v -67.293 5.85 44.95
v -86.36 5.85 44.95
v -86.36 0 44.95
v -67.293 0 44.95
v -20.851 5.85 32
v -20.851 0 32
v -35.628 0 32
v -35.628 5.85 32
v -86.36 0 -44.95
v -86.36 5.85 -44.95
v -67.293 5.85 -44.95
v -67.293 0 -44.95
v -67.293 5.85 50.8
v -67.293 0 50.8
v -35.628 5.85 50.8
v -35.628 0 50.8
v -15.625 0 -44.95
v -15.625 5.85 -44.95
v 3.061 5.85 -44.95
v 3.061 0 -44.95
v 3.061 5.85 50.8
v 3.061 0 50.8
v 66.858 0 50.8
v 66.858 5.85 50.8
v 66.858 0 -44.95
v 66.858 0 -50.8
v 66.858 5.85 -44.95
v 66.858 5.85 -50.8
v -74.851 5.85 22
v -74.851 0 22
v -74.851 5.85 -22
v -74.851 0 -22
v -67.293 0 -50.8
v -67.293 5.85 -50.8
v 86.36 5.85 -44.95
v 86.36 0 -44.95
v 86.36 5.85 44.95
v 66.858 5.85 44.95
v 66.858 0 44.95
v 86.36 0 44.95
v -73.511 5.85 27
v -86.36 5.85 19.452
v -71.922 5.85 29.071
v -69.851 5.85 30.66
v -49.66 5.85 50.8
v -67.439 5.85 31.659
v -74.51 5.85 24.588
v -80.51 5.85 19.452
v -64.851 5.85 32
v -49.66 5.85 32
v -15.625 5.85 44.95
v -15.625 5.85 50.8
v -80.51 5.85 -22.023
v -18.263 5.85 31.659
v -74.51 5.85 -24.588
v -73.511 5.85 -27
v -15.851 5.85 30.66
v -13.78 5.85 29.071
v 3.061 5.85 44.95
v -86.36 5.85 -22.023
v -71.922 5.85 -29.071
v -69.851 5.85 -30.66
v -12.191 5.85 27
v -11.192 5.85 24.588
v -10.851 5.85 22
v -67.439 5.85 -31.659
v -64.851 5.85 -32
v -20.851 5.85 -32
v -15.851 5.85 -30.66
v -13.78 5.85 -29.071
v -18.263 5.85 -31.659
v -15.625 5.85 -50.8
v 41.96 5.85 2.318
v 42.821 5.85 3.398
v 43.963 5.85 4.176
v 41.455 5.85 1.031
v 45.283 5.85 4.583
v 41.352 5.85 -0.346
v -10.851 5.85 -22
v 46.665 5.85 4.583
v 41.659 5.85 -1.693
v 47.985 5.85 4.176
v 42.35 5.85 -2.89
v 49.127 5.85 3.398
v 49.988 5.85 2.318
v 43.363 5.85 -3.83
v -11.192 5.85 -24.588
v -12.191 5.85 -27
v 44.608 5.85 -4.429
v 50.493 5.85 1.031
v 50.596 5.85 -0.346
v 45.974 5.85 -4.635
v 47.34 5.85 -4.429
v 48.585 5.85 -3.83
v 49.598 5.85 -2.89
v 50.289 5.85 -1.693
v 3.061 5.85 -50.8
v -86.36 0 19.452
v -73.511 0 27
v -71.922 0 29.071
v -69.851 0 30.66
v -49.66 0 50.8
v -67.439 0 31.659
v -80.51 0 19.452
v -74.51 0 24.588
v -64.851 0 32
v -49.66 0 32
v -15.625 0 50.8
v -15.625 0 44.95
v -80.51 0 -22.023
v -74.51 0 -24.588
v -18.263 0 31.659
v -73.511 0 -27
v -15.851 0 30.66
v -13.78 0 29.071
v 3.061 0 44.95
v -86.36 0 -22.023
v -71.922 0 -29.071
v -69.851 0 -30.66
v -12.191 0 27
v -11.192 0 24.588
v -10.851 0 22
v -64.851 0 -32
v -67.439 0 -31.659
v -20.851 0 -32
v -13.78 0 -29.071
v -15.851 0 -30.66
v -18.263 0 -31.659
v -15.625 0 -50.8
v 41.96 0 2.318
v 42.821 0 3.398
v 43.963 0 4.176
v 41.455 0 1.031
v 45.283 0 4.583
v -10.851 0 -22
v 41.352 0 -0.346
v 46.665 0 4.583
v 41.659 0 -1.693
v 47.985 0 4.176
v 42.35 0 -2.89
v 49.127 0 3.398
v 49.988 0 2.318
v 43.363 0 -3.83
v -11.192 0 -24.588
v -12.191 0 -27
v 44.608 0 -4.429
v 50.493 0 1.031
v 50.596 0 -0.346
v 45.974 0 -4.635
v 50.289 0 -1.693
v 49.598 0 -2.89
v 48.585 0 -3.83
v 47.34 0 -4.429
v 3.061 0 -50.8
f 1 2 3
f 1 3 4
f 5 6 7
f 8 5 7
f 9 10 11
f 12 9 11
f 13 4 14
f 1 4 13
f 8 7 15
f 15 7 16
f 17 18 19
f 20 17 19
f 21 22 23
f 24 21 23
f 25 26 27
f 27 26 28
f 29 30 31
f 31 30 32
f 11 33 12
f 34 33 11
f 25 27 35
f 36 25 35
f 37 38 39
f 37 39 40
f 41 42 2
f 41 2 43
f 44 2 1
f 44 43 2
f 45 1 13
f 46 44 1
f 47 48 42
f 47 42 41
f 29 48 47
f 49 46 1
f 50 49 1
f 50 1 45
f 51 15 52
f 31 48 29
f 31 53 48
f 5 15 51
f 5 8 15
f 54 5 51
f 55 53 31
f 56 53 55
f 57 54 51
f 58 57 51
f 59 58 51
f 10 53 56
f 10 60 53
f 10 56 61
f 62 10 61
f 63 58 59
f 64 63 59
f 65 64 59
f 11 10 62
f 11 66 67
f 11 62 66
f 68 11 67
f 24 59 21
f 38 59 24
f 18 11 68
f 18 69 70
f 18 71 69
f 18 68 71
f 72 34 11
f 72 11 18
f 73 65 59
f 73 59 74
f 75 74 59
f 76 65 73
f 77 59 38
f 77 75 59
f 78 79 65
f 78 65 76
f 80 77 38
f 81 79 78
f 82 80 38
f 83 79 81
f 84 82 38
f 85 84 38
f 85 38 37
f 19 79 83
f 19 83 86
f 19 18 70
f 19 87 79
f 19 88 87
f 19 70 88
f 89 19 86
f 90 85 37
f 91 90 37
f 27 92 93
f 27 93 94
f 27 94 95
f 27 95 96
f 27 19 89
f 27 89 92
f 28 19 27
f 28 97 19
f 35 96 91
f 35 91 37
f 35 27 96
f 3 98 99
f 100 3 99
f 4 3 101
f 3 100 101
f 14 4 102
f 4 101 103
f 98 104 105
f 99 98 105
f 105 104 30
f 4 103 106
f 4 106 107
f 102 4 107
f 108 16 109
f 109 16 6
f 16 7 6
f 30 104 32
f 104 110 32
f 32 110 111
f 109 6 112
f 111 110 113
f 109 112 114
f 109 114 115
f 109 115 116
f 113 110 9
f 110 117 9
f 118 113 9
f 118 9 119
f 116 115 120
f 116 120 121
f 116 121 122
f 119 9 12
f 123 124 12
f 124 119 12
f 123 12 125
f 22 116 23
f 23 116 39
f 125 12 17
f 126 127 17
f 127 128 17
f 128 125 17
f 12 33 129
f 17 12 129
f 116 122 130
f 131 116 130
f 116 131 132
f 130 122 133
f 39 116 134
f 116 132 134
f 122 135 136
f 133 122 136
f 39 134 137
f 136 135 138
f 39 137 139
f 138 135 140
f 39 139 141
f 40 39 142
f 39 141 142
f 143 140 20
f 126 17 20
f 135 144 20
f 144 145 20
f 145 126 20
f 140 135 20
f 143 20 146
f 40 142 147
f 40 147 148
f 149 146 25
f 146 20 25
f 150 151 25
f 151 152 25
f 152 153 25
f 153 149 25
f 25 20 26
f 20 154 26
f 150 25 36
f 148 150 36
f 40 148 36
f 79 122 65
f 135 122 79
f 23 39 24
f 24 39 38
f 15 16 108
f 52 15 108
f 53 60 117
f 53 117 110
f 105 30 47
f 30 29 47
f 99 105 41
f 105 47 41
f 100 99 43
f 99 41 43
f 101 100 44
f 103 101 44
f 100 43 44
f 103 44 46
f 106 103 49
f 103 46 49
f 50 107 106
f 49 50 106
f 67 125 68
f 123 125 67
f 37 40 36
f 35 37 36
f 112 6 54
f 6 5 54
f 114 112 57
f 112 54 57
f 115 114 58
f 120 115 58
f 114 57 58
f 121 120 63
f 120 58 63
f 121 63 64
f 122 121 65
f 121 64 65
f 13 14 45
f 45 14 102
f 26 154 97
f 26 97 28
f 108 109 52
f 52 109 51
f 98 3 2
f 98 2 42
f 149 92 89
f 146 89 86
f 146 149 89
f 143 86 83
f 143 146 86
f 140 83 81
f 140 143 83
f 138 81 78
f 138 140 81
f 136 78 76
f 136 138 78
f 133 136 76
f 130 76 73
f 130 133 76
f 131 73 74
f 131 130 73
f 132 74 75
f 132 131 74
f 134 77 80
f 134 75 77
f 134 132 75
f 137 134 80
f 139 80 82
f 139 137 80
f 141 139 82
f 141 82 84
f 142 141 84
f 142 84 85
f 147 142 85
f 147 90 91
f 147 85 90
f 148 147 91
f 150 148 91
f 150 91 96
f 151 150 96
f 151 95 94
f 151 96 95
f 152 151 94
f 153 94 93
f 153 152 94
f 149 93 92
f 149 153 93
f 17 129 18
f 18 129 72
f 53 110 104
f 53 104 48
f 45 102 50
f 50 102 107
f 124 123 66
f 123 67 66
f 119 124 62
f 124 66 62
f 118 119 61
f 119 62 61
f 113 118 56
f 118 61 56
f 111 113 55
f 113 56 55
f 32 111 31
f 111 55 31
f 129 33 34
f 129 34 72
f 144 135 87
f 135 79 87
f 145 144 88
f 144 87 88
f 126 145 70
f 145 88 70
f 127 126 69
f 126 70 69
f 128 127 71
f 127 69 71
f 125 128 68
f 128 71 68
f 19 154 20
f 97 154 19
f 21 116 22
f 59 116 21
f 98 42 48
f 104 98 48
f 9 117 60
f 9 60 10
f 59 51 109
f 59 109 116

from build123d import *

# Parameters (mm, degrees)
SKETCH1_W             = 172.72
SKETCH1_H             = 101.6
BOSS_EXTRUDE1_DEPTH   = 5.85
SKETCH5_R             = 4.635
CUT_EXTRUDE10_DEPTH   = 20
FILLET6_R             = 10
CAVITY1_START         = -50.8
CAVITY1_OUTLINE_W     = 19.066688648
CAVITY1_OUTLINE_H     = 5.85
CAVITY1_OUTLINE_W_2   = 18.685550926
CAVITY1_OUTLINE_W_3   = 19.50170991
CAVITY1_DEPTH         = 5.85
CAVITY1_START_2       = 44.95
CAVITY1_2_OUTLINE_W   = 19.066688648
CAVITY1_2_OUTLINE_H   = 5.85
CAVITY1_2_OUTLINE_W_2 = 18.685550926
CAVITY1_2_OUTLINE_W_3 = 19.50170991
CAVITY1_2_DEPTH       = 5.85
CAVITY1_START_3       = -22.02311963
CAVITY1_3_OUTLINE_W   = 5.85
CAVITY1_3_OUTLINE_H   = 5.85
CAVITY1_3_DEPTH       = 41.475447085


# Read off the part's stored shape, not the designer's step: Cavity1
with BuildPart() as part:
    # Sketch1 → Boss-Extrude1 (new body)
    with BuildSketch(Plane(origin=(0, 0, 0), x_dir=(1, 0, 0), z_dir=(0, 1, 0))):
        Rectangle(SKETCH1_W, SKETCH1_H)
    extrude(amount=BOSS_EXTRUDE1_DEPTH)

    # Sketch5 → Cut-Extrude10 (cut)
    with BuildSketch(Plane(origin=(0, 0, 0), x_dir=(1, 0, 0), z_dir=(0, 1, 0))):
        with Locations(Location((45.9739194, 0, 0), (0, 0, 90))):
            Circle(SKETCH5_R)
        Polygon((-10.850825335, 32), (-10.850825335, 0), (-10.850825335, -32), (-35.627924906, -32), (-35.627924906, -50.8), (-49.659575094, -50.8), (-49.659575094, -32), (-74.850825335, -32), (-74.850825335, 32), (-42.850825335, 32), align=None)
    extrude(amount=CUT_EXTRUDE10_DEPTH, mode=Mode.SUBTRACT)

    # Fillet6
    fillet6_edges = [part.edges().sort_by_distance(p)[0] for p in [
        (-10.850825335, 2.925, -32),
        (-74.850825335, 2.925, -32),
        (-74.850825335, 2.925, 32),
        (-10.850825335, 2.925, 32),
    ]]
    fillet(fillet6_edges, radius=FILLET6_R)

    # Cavity1 outline → Cavity1 (cut)
    with BuildSketch(Plane.XY.offset(CAVITY1_START)):
        with Locations((-76.826655676, 2.925)):
            Rectangle(CAVITY1_OUTLINE_W, CAVITY1_OUTLINE_H)
        with Locations((-6.281963463, 2.925)):
            Rectangle(CAVITY1_OUTLINE_W_2, CAVITY1_OUTLINE_H)
        with Locations((76.609145045, 2.925)):
            Rectangle(CAVITY1_OUTLINE_W_3, CAVITY1_OUTLINE_H)
    extrude(amount=CAVITY1_DEPTH, mode=Mode.SUBTRACT)

    # Cavity1 2 outline → Cavity1 2 (cut)
    with BuildSketch(Plane.XY.offset(CAVITY1_START_2)):
        with Locations((-76.826655676, 2.925)):
            Rectangle(CAVITY1_2_OUTLINE_W, CAVITY1_2_OUTLINE_H)
        with Locations((-6.281963463, 2.925)):
            Rectangle(CAVITY1_2_OUTLINE_W_2, CAVITY1_2_OUTLINE_H)
        with Locations((76.609145045, 2.925)):
            Rectangle(CAVITY1_2_OUTLINE_W_3, CAVITY1_2_OUTLINE_H)
    extrude(amount=CAVITY1_2_DEPTH, mode=Mode.SUBTRACT)

    # Cavity1 3 outline → Cavity1 3 (cut)
    with BuildSketch(Plane.XY.offset(CAVITY1_START_3)):
        with Locations((-83.435, 2.925)):
            Rectangle(CAVITY1_3_OUTLINE_W, CAVITY1_3_OUTLINE_H)
    extrude(amount=CAVITY1_3_DEPTH, mode=Mode.SUBTRACT)


solid = part.part
